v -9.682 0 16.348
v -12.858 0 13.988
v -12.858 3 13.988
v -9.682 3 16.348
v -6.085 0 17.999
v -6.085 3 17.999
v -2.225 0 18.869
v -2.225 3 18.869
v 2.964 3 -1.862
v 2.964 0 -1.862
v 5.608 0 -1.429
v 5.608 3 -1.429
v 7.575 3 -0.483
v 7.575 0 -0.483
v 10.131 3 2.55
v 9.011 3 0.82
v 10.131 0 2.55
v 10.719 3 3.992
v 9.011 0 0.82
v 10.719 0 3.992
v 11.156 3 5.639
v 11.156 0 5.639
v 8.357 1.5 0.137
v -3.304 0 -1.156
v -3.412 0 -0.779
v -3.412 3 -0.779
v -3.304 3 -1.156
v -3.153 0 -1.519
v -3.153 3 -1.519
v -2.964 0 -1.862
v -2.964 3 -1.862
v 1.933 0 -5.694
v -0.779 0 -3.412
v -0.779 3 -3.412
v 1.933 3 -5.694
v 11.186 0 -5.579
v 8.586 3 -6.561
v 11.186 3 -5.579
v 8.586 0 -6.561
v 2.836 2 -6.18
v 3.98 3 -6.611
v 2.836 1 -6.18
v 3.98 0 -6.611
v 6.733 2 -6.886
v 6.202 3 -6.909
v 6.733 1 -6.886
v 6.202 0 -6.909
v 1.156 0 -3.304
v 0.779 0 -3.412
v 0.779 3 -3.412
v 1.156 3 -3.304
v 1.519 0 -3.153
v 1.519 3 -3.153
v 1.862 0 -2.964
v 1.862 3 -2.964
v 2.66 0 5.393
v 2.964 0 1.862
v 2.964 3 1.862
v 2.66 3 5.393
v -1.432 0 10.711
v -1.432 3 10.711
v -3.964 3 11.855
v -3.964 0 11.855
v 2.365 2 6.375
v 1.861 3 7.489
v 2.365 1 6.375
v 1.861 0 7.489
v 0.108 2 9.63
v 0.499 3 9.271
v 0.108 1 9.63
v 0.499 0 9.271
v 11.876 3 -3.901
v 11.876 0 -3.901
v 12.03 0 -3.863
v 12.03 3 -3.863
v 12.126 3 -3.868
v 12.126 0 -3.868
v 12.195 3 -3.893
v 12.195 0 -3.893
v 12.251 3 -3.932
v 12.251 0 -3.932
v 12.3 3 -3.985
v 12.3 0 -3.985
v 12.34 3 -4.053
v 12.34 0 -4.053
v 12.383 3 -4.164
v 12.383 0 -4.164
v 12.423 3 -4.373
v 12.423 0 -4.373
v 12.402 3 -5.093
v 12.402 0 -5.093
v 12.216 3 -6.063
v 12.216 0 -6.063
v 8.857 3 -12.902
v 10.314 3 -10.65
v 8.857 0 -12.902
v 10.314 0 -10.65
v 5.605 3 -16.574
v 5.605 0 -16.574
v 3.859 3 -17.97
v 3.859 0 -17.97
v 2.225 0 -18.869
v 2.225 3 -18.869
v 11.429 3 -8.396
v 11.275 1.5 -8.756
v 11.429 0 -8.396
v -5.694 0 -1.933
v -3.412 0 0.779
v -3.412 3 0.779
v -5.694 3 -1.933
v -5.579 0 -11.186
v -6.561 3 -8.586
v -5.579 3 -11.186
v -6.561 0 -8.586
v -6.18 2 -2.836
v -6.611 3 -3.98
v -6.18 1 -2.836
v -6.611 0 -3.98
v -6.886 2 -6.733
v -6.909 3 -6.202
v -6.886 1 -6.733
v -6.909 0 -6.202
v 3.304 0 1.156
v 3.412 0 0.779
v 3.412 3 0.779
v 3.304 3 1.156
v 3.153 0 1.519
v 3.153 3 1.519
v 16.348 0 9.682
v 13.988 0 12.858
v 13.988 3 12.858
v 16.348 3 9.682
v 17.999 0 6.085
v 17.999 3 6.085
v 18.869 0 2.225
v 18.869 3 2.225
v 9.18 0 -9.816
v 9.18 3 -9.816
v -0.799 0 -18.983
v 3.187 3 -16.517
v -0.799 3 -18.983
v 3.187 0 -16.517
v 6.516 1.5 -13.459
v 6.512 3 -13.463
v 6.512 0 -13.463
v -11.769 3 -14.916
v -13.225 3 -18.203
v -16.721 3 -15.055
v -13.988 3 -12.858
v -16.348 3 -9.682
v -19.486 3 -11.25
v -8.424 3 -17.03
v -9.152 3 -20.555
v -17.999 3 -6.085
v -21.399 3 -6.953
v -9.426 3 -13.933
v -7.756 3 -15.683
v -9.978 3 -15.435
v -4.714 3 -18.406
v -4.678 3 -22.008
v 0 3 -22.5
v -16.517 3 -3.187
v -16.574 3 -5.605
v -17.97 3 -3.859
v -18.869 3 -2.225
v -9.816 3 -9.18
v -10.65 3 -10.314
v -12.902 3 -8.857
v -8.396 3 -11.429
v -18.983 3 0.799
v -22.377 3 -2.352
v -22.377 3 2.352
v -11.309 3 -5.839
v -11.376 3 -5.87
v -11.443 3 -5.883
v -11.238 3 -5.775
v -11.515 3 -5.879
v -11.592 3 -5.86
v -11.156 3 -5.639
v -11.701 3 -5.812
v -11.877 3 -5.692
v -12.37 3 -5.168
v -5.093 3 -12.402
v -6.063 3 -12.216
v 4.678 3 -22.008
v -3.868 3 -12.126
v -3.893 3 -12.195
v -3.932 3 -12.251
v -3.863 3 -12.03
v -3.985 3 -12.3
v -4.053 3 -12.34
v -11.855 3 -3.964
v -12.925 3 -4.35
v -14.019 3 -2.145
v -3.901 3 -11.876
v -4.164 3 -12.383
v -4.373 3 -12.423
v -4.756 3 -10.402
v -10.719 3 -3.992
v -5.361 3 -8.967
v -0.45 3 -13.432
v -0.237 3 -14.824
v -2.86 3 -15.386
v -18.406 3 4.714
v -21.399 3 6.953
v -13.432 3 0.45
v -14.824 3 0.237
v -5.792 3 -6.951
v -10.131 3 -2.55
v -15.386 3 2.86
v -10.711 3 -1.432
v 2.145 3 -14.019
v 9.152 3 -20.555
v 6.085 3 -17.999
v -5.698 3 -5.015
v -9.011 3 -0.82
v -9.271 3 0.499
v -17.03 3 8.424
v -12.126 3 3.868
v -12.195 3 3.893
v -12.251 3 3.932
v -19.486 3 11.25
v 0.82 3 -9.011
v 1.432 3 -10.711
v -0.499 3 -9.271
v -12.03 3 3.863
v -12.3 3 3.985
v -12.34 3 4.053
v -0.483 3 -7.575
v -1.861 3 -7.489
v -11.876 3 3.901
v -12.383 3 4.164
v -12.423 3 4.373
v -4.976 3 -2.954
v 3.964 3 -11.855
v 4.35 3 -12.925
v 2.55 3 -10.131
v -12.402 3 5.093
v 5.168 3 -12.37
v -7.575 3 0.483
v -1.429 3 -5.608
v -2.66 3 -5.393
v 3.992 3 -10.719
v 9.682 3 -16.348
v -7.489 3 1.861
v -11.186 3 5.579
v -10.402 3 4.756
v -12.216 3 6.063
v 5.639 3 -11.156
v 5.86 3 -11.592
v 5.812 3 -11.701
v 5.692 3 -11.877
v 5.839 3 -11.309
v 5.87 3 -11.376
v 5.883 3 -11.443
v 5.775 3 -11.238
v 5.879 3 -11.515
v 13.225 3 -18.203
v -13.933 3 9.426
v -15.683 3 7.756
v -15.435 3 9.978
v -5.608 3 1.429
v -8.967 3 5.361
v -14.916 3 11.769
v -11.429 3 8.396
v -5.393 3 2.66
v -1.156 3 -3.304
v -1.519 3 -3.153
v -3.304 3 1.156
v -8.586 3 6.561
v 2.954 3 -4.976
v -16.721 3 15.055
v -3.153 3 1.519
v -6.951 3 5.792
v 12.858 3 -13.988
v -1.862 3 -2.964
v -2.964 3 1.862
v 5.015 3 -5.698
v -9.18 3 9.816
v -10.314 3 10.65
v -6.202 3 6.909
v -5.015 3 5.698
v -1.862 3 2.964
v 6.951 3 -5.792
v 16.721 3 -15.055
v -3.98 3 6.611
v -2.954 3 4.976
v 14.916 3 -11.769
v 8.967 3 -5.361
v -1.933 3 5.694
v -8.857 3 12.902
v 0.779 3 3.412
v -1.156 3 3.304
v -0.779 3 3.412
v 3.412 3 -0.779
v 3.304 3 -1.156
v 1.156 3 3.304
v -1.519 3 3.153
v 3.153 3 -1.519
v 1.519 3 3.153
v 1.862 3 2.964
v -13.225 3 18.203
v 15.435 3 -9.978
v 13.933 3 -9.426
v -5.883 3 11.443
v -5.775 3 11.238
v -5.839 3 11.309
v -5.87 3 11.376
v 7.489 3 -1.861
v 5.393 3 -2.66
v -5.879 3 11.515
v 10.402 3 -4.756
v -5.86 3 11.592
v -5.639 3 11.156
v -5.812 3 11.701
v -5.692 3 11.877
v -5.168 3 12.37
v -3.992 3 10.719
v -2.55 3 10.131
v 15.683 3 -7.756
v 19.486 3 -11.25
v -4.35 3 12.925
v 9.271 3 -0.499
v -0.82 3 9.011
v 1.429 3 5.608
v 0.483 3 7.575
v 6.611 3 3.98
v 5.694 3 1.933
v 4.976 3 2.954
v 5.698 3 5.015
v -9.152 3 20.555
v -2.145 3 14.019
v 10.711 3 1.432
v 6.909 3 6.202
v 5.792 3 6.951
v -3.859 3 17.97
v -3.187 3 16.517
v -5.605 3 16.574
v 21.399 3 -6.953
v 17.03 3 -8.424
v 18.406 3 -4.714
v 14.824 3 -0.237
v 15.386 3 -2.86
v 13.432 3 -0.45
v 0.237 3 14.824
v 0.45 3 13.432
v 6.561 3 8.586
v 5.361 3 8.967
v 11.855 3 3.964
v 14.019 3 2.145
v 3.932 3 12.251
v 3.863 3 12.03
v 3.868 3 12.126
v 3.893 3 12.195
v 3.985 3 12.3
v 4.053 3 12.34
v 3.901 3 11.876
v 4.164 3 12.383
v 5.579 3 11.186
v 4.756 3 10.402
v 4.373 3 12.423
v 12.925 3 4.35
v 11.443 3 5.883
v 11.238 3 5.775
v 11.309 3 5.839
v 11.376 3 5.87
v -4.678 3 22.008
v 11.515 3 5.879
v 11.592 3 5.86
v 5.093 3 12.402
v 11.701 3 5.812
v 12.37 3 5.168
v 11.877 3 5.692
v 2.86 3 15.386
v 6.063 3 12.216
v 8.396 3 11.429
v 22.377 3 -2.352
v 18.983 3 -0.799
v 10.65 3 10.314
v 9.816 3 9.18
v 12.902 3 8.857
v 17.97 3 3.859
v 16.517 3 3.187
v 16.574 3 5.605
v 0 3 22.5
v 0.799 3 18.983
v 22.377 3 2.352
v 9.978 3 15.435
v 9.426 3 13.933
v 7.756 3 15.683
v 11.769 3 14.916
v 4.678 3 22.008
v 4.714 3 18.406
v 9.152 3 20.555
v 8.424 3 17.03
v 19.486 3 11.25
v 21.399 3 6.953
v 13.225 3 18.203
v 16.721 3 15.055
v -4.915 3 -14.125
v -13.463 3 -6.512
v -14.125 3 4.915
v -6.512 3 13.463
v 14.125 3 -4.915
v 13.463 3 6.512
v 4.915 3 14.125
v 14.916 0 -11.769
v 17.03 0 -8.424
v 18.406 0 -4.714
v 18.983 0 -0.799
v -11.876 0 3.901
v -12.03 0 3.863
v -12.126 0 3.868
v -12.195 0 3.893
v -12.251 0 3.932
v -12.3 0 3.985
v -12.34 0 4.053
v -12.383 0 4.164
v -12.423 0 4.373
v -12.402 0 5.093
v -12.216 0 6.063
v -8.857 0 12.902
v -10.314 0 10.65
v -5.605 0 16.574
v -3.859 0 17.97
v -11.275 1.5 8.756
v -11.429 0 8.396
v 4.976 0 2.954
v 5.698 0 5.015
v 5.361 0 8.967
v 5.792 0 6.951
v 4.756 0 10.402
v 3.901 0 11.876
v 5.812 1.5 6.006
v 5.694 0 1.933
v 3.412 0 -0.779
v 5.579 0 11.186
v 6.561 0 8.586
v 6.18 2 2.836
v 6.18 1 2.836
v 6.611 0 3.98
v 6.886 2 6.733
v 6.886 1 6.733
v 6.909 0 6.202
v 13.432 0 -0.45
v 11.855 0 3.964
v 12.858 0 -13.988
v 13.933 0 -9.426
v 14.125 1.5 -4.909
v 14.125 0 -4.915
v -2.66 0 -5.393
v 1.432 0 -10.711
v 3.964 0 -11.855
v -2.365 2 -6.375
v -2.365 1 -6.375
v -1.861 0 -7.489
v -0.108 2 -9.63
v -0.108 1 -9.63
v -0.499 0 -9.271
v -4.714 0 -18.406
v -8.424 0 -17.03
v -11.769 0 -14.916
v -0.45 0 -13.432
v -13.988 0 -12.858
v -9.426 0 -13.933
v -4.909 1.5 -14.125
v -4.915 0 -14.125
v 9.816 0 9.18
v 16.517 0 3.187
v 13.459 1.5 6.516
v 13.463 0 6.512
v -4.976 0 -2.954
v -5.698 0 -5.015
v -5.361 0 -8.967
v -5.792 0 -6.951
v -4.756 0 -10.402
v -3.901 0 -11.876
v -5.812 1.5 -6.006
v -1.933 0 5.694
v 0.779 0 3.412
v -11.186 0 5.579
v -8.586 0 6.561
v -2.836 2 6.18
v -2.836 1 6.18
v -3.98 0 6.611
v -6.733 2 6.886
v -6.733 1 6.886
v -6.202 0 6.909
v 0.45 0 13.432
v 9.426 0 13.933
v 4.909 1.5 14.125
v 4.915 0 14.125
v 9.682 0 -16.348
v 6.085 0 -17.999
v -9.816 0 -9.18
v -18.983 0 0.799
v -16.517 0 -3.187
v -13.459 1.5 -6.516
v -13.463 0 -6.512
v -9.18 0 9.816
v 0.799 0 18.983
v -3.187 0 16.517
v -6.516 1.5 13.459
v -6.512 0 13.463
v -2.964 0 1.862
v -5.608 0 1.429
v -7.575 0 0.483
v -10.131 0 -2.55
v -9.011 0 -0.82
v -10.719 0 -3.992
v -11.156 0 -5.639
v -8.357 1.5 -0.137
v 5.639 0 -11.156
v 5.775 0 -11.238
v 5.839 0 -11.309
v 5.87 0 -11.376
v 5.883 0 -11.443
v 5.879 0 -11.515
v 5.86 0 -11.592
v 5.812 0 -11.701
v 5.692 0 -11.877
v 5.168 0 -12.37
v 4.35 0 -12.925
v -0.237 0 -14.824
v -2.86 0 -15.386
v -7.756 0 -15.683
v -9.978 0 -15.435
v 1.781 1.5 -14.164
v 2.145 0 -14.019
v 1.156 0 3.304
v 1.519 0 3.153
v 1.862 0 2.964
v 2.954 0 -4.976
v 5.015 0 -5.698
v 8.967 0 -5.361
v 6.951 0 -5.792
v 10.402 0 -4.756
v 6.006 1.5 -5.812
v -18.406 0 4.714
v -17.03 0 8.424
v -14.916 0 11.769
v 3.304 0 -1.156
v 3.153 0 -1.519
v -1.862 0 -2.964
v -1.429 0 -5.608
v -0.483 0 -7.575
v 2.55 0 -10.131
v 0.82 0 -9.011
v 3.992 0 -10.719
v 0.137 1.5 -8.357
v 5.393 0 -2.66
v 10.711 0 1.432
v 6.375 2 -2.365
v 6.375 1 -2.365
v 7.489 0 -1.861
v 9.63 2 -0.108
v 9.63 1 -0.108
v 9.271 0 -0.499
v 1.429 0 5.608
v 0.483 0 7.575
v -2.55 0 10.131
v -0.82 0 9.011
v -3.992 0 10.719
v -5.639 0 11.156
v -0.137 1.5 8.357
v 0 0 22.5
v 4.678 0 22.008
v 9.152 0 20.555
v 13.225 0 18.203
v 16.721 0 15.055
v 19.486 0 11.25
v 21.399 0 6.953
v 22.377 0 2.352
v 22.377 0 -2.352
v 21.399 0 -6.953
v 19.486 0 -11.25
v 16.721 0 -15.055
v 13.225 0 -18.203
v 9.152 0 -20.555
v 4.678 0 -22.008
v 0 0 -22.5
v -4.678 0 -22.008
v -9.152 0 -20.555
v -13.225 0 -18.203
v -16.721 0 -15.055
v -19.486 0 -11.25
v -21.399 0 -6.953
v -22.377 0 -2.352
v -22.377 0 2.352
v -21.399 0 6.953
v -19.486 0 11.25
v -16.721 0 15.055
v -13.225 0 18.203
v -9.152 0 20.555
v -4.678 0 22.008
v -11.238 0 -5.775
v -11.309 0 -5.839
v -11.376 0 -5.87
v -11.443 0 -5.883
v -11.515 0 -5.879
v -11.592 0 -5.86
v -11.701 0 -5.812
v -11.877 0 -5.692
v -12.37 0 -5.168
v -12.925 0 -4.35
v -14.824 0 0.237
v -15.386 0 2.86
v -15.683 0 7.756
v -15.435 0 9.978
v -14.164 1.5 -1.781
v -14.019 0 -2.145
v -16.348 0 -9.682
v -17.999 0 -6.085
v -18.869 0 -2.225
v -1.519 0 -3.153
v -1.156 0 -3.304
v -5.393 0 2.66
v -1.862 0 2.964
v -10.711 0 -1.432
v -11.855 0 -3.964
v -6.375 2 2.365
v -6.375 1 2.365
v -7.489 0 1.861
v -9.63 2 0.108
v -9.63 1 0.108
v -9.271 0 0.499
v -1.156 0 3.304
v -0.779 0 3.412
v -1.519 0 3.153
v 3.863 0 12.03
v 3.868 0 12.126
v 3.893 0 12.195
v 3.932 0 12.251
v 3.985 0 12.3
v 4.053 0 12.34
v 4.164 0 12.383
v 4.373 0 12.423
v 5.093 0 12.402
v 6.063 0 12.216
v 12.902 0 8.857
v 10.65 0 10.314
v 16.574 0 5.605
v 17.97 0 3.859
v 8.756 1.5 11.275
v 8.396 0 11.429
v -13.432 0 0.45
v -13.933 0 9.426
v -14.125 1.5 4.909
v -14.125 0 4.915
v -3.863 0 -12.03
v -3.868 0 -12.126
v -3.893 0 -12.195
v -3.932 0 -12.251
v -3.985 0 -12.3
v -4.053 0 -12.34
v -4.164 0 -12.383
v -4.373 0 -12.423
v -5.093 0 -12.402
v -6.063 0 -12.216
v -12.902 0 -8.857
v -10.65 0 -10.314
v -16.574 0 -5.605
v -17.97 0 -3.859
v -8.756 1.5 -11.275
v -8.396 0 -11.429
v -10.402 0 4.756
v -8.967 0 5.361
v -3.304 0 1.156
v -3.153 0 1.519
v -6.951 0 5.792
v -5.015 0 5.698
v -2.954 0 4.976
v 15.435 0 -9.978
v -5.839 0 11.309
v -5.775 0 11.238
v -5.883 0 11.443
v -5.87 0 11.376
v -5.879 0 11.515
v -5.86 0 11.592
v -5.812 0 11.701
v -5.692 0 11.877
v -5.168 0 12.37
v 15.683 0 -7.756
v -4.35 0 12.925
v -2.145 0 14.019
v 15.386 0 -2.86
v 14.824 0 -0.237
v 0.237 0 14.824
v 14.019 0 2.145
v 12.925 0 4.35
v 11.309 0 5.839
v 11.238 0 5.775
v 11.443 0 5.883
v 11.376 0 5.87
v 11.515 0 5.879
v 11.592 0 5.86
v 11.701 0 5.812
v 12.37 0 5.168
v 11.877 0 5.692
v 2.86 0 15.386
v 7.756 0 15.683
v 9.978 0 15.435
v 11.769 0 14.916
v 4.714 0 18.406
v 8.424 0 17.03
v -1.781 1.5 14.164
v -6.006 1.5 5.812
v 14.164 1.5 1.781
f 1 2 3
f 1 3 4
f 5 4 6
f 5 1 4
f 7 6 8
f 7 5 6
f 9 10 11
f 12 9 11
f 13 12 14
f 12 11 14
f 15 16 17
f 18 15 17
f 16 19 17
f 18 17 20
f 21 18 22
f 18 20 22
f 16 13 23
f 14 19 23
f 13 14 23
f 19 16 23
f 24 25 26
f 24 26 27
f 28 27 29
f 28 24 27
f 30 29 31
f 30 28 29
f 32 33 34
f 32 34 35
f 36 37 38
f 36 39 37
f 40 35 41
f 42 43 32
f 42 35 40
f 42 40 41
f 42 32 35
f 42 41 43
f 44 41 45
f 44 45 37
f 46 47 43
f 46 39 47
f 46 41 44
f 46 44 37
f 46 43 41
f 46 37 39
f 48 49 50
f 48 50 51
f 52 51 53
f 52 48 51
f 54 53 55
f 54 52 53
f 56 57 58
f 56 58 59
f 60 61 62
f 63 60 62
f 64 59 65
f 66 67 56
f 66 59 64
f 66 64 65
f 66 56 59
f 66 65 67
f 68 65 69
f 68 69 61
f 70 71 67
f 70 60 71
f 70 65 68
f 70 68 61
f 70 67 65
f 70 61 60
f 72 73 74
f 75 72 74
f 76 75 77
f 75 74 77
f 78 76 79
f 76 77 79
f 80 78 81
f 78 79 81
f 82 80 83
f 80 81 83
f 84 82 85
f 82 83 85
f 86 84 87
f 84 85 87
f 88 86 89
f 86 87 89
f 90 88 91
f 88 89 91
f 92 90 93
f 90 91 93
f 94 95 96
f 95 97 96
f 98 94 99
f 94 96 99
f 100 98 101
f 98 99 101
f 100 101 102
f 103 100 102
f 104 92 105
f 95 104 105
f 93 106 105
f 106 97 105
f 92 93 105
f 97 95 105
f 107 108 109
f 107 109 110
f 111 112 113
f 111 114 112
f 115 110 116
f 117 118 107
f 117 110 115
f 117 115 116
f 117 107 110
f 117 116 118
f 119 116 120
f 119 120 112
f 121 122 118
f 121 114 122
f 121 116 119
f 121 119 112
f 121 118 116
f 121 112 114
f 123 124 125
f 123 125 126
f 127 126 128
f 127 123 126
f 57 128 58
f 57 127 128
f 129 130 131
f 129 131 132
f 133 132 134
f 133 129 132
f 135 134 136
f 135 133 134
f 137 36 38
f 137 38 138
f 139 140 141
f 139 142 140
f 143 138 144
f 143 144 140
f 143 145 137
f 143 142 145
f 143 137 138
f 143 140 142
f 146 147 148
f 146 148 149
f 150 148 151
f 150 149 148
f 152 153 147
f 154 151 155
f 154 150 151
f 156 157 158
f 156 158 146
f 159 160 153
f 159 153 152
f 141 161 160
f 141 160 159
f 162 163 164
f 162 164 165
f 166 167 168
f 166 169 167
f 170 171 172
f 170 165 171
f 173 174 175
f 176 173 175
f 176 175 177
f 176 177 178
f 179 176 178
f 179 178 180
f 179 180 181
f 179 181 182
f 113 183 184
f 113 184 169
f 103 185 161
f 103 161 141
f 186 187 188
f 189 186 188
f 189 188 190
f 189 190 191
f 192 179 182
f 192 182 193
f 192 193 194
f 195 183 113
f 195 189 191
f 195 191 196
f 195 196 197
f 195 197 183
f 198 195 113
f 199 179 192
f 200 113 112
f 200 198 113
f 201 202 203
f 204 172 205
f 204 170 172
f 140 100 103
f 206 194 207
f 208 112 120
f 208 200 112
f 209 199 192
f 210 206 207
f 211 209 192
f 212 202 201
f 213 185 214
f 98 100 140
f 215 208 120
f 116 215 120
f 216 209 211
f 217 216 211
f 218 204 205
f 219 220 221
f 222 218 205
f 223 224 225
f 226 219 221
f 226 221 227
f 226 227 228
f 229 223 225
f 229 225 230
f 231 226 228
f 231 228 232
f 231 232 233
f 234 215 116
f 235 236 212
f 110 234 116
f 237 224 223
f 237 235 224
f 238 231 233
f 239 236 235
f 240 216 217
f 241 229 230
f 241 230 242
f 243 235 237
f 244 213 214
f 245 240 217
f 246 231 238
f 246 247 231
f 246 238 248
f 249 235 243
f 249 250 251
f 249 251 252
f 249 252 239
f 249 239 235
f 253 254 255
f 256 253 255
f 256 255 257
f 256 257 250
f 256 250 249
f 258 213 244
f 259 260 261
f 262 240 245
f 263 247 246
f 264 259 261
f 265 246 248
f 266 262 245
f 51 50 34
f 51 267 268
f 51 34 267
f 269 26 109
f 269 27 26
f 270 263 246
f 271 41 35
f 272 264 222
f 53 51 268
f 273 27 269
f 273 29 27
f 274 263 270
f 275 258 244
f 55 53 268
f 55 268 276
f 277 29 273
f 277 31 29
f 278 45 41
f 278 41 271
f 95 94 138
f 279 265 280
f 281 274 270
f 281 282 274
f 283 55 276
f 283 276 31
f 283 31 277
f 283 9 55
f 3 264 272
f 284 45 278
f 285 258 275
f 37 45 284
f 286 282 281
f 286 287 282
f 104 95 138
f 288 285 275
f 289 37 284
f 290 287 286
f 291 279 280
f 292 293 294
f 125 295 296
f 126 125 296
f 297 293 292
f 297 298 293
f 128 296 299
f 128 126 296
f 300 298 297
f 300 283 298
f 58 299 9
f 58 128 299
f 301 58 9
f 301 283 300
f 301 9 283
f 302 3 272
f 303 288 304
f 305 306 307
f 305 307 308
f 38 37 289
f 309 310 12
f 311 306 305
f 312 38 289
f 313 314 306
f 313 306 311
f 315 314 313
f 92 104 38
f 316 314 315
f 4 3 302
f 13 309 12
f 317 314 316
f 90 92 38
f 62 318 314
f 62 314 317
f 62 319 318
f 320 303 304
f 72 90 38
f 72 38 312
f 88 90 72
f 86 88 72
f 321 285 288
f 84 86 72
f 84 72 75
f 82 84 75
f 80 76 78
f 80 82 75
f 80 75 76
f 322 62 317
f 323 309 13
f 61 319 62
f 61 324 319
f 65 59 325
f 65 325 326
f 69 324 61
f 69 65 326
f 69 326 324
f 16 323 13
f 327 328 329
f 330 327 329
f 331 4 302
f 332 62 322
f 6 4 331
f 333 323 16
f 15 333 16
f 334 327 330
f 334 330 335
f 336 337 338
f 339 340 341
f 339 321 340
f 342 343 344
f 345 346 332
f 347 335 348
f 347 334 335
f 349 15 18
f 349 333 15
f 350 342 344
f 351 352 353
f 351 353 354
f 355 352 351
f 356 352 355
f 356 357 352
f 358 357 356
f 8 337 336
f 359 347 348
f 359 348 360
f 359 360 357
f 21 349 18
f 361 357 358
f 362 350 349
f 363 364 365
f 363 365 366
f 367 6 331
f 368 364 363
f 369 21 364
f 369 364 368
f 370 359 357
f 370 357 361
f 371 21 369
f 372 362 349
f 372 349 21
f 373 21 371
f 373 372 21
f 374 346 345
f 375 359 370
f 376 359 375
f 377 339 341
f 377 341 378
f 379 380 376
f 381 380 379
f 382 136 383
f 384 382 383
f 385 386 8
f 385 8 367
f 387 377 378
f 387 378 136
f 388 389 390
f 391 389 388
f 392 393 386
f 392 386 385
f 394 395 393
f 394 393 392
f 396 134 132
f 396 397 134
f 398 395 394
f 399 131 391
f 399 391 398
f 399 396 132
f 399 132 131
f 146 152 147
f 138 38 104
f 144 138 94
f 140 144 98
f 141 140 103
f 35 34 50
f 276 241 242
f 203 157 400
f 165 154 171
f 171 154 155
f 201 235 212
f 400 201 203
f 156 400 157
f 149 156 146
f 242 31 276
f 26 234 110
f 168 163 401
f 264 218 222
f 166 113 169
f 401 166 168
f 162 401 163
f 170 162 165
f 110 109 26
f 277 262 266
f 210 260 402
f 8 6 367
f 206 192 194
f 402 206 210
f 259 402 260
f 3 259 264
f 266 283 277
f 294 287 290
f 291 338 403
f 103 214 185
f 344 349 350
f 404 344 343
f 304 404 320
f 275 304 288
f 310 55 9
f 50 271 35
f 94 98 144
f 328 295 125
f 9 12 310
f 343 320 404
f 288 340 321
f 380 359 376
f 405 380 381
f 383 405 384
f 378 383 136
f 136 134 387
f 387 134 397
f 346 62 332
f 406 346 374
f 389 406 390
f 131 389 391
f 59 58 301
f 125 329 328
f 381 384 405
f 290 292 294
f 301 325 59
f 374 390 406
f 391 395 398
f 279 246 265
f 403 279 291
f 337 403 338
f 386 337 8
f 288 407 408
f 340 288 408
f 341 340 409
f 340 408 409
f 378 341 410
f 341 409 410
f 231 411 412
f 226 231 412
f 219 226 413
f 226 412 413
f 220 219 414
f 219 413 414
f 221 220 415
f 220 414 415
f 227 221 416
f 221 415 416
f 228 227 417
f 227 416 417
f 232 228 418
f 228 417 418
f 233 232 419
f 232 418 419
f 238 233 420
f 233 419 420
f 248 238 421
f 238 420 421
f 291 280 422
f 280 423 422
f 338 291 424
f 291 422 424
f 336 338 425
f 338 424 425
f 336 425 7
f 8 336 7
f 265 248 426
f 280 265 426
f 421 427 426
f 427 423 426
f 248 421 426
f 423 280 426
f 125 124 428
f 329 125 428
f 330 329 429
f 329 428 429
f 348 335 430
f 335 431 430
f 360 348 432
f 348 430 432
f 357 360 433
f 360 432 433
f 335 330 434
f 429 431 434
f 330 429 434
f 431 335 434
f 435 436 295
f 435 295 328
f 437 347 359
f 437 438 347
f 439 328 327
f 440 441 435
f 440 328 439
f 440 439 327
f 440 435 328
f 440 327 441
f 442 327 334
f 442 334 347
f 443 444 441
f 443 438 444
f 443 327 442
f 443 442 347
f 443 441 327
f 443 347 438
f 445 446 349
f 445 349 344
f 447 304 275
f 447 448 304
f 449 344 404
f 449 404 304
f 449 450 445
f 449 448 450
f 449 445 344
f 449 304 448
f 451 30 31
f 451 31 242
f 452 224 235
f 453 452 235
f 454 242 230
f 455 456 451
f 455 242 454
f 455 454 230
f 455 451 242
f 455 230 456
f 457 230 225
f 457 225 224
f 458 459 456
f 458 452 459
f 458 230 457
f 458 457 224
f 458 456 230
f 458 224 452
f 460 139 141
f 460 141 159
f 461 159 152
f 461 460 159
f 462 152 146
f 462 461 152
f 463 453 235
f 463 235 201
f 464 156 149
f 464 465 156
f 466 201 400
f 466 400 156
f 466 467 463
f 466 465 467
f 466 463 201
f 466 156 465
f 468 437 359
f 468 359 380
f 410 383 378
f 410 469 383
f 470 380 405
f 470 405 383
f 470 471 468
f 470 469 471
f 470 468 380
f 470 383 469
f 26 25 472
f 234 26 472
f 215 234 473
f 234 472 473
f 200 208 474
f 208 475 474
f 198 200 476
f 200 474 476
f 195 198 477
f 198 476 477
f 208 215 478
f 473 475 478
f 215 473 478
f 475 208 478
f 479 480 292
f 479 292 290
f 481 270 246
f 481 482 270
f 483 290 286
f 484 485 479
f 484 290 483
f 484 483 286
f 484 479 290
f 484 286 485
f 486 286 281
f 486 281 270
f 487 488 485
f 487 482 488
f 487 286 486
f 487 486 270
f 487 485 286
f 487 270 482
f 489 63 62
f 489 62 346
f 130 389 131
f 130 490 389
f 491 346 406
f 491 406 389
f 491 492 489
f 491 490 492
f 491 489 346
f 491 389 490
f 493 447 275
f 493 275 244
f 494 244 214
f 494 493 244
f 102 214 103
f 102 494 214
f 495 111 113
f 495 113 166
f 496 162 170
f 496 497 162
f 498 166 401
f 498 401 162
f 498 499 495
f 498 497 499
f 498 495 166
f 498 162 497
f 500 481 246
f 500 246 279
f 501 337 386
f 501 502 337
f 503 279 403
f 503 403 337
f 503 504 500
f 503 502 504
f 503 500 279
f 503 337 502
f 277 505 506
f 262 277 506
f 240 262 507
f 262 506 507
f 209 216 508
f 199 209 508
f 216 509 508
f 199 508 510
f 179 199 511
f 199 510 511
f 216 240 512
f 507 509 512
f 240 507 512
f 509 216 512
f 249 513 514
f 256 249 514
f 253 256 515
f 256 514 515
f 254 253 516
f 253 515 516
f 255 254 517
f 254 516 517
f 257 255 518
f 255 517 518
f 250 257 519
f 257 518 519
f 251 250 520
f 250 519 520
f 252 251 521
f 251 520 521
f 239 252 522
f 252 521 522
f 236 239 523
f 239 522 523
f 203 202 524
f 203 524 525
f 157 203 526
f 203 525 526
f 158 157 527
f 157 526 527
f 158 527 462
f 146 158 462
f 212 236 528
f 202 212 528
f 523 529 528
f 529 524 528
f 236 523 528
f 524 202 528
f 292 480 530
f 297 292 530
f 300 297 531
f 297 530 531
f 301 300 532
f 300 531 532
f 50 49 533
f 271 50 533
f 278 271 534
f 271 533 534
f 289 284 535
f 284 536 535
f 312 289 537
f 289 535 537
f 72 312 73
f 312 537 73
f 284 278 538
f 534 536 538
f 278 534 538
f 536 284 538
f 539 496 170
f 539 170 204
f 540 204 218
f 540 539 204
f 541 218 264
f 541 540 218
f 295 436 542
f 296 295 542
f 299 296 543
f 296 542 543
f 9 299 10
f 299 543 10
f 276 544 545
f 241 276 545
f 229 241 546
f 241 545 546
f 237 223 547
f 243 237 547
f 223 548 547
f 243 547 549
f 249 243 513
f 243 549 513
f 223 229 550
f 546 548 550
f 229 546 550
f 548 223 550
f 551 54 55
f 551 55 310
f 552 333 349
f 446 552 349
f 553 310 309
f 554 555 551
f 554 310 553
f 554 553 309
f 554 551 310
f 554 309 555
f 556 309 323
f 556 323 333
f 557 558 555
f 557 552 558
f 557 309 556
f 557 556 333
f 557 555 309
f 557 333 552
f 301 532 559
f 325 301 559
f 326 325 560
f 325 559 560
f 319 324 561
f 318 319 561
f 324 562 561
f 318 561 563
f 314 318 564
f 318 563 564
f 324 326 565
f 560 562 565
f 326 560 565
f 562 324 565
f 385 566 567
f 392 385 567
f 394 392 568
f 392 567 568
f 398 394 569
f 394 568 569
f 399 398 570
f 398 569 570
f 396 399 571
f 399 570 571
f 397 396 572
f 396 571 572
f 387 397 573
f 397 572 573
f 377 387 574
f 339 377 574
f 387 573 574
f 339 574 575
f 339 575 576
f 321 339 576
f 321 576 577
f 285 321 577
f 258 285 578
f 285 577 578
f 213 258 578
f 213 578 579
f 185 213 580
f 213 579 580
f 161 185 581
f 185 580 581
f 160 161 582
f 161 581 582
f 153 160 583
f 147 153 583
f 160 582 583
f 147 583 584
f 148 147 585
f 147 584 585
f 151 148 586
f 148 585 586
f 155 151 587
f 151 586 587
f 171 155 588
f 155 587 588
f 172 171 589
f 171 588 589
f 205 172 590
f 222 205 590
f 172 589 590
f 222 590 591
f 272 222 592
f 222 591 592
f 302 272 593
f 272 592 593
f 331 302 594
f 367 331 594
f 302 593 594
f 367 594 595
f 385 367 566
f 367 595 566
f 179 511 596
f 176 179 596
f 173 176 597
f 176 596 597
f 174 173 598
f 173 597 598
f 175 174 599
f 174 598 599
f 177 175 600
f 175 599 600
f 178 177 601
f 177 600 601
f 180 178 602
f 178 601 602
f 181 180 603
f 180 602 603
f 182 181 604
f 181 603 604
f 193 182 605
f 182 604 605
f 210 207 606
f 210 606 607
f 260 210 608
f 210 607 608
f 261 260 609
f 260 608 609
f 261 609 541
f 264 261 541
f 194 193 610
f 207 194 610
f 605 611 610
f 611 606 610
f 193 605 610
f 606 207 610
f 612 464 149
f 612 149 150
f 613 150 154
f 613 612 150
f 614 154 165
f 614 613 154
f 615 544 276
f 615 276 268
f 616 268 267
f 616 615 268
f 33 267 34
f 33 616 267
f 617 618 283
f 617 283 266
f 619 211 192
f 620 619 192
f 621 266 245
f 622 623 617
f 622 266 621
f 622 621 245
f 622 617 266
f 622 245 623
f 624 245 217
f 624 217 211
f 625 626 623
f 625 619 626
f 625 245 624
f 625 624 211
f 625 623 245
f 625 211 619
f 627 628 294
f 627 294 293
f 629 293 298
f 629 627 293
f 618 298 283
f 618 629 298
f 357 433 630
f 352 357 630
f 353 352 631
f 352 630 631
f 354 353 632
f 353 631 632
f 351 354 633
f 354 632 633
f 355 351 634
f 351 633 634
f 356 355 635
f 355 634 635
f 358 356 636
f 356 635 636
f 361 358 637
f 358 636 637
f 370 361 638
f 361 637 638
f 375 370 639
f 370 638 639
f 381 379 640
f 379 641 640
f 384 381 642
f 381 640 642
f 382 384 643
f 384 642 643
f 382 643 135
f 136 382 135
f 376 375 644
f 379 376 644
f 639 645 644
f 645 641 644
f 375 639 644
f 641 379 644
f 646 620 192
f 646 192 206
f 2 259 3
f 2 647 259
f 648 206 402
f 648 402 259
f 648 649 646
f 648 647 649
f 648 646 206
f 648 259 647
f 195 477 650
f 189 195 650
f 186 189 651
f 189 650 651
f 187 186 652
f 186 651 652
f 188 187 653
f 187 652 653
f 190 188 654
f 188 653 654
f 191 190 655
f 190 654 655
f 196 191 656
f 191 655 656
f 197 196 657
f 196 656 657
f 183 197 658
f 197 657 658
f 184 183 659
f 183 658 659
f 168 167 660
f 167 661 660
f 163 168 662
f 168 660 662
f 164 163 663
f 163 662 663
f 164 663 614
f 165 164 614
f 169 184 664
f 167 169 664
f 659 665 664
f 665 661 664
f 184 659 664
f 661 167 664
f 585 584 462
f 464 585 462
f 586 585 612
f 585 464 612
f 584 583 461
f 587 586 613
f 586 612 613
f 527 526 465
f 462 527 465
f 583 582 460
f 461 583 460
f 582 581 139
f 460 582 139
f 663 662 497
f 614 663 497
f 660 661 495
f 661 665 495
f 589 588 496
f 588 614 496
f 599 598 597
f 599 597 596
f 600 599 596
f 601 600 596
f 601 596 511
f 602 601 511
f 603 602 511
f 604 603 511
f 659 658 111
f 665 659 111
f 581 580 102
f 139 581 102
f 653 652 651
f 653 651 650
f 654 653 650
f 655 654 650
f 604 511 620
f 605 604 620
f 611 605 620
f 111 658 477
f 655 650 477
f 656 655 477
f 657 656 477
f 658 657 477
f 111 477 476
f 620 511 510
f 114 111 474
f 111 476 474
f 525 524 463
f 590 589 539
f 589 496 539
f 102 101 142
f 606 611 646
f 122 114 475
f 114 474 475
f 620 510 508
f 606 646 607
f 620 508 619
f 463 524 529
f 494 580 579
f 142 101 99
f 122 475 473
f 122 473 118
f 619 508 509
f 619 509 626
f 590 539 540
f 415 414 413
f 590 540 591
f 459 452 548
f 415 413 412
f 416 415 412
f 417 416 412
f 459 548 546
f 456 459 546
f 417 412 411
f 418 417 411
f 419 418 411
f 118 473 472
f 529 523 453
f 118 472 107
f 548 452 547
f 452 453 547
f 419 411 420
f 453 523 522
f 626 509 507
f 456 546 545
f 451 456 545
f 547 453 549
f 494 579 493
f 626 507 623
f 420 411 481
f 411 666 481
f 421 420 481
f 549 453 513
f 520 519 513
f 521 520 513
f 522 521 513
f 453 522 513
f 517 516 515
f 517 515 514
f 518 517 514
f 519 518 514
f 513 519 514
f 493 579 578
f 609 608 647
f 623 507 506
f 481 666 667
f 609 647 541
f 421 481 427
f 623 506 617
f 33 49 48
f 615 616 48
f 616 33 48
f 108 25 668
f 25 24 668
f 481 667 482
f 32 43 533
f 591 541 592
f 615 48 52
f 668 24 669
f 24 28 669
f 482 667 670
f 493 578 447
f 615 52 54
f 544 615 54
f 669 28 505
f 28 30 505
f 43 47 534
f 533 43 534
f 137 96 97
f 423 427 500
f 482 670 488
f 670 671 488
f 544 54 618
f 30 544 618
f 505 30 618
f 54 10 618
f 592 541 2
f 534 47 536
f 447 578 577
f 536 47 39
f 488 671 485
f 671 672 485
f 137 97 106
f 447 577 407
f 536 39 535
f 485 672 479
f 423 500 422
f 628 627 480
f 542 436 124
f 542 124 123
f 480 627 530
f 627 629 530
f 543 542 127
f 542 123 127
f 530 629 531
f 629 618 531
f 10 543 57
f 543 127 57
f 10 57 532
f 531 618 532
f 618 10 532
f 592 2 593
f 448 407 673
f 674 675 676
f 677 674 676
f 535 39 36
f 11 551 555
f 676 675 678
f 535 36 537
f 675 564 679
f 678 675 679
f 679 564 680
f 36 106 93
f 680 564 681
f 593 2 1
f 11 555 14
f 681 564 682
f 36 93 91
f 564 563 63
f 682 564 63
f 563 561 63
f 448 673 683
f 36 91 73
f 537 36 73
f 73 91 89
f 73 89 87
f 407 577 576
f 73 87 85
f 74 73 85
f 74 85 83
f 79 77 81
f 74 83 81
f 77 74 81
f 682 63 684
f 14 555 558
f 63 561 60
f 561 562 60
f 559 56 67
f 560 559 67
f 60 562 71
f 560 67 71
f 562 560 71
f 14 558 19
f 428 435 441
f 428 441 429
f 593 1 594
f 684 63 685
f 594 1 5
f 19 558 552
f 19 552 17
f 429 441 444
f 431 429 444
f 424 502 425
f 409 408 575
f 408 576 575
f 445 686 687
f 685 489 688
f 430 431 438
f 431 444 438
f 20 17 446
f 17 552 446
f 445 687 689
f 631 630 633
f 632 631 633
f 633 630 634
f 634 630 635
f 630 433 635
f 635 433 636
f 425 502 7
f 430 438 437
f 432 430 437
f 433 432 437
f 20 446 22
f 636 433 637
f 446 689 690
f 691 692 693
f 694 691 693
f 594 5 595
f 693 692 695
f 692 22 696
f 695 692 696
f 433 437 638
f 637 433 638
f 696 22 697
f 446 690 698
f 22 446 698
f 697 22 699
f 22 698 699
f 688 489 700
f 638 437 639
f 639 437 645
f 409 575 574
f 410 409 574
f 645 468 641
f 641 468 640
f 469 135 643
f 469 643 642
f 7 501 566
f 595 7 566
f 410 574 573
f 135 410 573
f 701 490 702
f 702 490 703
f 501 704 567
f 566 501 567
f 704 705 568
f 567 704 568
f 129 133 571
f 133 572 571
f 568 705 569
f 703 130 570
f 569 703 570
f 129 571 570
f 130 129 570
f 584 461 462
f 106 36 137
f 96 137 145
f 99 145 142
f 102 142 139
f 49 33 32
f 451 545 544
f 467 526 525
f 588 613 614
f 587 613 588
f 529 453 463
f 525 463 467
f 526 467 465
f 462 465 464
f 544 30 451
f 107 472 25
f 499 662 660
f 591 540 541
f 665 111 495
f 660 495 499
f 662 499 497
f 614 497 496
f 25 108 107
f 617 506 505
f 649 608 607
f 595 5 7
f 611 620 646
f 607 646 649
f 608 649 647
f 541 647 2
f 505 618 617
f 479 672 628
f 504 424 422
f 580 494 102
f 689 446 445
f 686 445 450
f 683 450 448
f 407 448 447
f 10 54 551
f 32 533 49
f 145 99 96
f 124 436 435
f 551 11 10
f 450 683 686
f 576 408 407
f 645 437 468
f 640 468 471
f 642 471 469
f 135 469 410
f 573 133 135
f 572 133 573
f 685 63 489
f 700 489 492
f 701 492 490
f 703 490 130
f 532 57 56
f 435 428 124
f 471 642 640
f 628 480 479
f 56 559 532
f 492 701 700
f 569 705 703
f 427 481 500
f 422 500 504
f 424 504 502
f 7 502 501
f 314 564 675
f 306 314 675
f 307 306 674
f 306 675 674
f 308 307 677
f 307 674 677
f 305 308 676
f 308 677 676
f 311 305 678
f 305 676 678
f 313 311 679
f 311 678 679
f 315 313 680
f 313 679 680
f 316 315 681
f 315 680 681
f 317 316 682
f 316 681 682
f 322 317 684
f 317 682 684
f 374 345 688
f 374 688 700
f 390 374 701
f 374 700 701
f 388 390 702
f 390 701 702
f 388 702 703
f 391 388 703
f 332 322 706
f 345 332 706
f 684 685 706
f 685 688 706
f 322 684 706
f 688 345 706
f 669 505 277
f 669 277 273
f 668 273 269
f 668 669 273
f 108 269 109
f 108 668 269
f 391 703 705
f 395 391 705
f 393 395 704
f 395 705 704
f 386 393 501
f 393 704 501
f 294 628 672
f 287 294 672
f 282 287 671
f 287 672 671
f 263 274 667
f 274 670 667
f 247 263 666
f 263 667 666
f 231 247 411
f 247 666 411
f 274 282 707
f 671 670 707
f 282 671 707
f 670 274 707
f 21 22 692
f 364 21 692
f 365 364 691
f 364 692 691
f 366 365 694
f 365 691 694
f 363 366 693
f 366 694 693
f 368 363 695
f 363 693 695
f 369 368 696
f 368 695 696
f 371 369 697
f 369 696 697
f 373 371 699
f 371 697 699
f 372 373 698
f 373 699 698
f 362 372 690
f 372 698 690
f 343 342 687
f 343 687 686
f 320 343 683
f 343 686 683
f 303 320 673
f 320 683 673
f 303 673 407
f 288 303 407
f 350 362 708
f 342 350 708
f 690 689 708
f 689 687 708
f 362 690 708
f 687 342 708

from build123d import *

# Parameters (mm, degrees)
SKETCH1_R           = 22.5
BOSS_EXTRUDE1_DEPTH = 3


with BuildPart() as part:
    # Sketch1 → Boss-Extrude1 (new body)
    with BuildSketch(Plane(origin=(0, 0, 0), x_dir=(1, 0, 0), z_dir=(0, 1, 0))):
        with Locations(Location((0, 0, 0), (0, 0, 270))):
            Circle(SKETCH1_R)
        with BuildLine():
            ThreePointArc((12.858274793, 13.988022353), (7.926678354, 17.267535154), (2.224901963, 18.869282214))
            add(Edge.make_bspline(
                [(11.875562109, 3.901413152), (12.889627473, 3.505325226), (11.613923706, 10.788790468), (5.151799162, 17.696017864), (2.224901963, 18.869282214)],
                knots=[0, 0, 0, 0, 0.363857402, 1, 1, 1, 1], degree=3))
            add(Edge.make_bspline(
                [(0.778823269, 3.412247693), (5.685303017, 7.967969249), (11.875562109, 3.901413152)],
                knots=[0, 0, 0, 1, 1, 1], degree=2))
            ThreePointArc((0.778823269, 3.412247693), (1.339392013, 3.233578364), (1.862112268, 2.963534697))
            add(Edge.make_bspline(
                [(1.862112268, 2.963534697), (7.080742295, 3.142252132), (10.068013486, 1.06766484), (11.854735792, -3.964245112)],
                knots=[0, 0, 0, 0, 1, 1, 1, 1], degree=3))
            add(Edge.make_bspline(
                [(11.854735792, -3.964245112), (15.892673154, 4.806059129), (12.858274793, 13.988022353)],
                knots=[0, 0, 0, 1, 1, 1], degree=2))
        make_face(mode=Mode.SUBTRACT)
        with BuildLine():
            ThreePointArc((0.778823269, -3.412247693), (1.339392013, -3.233578364), (1.862112268, -2.963534697))
            add(Edge.make_bspline(
                [(1.862112268, -2.963534697), (1.614088771, -9.654321405), (-5.638574802, -11.156006194)],
                knots=[0, 0, 0, 1, 1, 1], degree=2))
            add(Edge.make_bspline(
                [(-5.638574802, -11.156006194), (-6.635703756, -11.592982231), (-0.583457308, -15.84111111), (8.870102109, -16.155846354), (11.769354144, -14.915840675)],
                knots=[0, 0, 0, 0, 0.363857402, 1, 1, 1, 1], degree=3))
            ThreePointArc((11.769354144, -14.915840675), (6.604983185, -17.814999218), (0.79885216, -18.983198762))
            add(Edge.make_bspline(
                [(-11.185708668, -5.579419467), (-7.839419958, -14.63621396), (0.79885216, -18.983198762)],
                knots=[0, 0, 0, 1, 1, 1], degree=2))
            add(Edge.make_bspline(
                [(0.778823269, -3.412247693), (-2.784933102, -7.228748683), (-6.36420756, -7.874113658), (-11.185708668, -5.579419467)],
                knots=[0, 0, 0, 0, 1, 1, 1, 1], degree=3))
        make_face(mode=Mode.SUBTRACT)
        with BuildLine():
            ThreePointArc((-0.79885216, 18.983198762), (-6.604983185, 17.814999218), (-11.769354144, 14.915840675))
            add(Edge.make_bspline(
                [(5.638574802, 11.156006194), (6.635703756, 11.592982231), (0.583457308, 15.84111111), (-8.870102109, 16.155846354), (-11.769354144, 14.915840675)],
                knots=[0, 0, 0, 0, 0.363857402, 1, 1, 1, 1], degree=3))
            add(Edge.make_bspline(
                [(-1.862112268, 2.963534697), (-1.614088771, 9.654321405), (5.638574802, 11.156006194)],
                knots=[0, 0, 0, 1, 1, 1], degree=2))
            ThreePointArc((-1.862112268, 2.963534697), (-1.339392013, 3.233578364), (-0.778823269, 3.412247693))
            add(Edge.make_bspline(
                [(-0.778823269, 3.412247693), (2.784933102, 7.228748683), (6.36420756, 7.874113658), (11.185708668, 5.579419467)],
                knots=[0, 0, 0, 0, 1, 1, 1, 1], degree=3))
            add(Edge.make_bspline(
                [(11.185708668, 5.579419467), (7.839419958, 14.63621396), (-0.79885216, 18.983198762)],
                knots=[0, 0, 0, 1, 1, 1], degree=2))
        make_face(mode=Mode.SUBTRACT)
        with BuildLine():
            ThreePointArc((-13.988022353, 12.858274793), (-17.267535154, 7.926678354), (-18.869282214, 2.224901963))
            add(Edge.make_bspline(
                [(-3.901413152, 11.875562109), (-3.505325226, 12.889627473), (-10.788790468, 11.613923706), (-17.696017864, 5.151799162), (-18.869282214, 2.224901963)],
                knots=[0, 0, 0, 0, 0.363857402, 1, 1, 1, 1], degree=3))
            add(Edge.make_bspline(
                [(-3.412247693, 0.778823269), (-7.967969249, 5.685303017), (-3.901413152, 11.875562109)],
                knots=[0, 0, 0, 1, 1, 1], degree=2))
            ThreePointArc((-3.412247693, 0.778823269), (-3.233578364, 1.339392013), (-2.963534697, 1.862112268))
            add(Edge.make_bspline(
                [(-2.963534697, 1.862112268), (-3.142252132, 7.080742295), (-1.06766484, 10.068013486), (3.964245112, 11.854735792)],
                knots=[0, 0, 0, 0, 1, 1, 1, 1], degree=3))
            add(Edge.make_bspline(
                [(3.964245112, 11.854735792), (-4.806059129, 15.892673154), (-13.988022353, 12.858274793)],
                knots=[0, 0, 0, 1, 1, 1], degree=2))
        make_face(mode=Mode.SUBTRACT)
        with BuildLine():
            ThreePointArc((-18.983198762, -0.79885216), (-17.814999218, -6.604983185), (-14.915840675, -11.769354144))
            add(Edge.make_bspline(
                [(-11.156006194, 5.638574802), (-11.592982231, 6.635703756), (-15.84111111, 0.583457308), (-16.155846354, -8.870102109), (-14.915840675, -11.769354144)],
                knots=[0, 0, 0, 0, 0.363857402, 1, 1, 1, 1], degree=3))
            add(Edge.make_bspline(
                [(-2.963534697, -1.862112268), (-9.654321405, -1.614088771), (-11.156006194, 5.638574802)],
                knots=[0, 0, 0, 1, 1, 1], degree=2))
            ThreePointArc((-2.963534697, -1.862112268), (-3.233578364, -1.339392013), (-3.412247693, -0.778823269))
            add(Edge.make_bspline(
                [(-3.412247693, -0.778823269), (-7.228748683, 2.784933102), (-7.874113658, 6.36420756), (-5.579419467, 11.185708668)],
                knots=[0, 0, 0, 0, 1, 1, 1, 1], degree=3))
            add(Edge.make_bspline(
                [(-5.579419467, 11.185708668), (-14.63621396, 7.839419958), (-18.983198762, -0.79885216)],
                knots=[0, 0, 0, 1, 1, 1], degree=2))
        make_face(mode=Mode.SUBTRACT)
        with BuildLine():
            ThreePointArc((-12.858274793, -13.988022353), (-7.926678354, -17.267535154), (-2.224901963, -18.869282214))
            add(Edge.make_bspline(
                [(-11.875562109, -3.901413152), (-12.889627473, -3.505325226), (-11.613923706, -10.788790468), (-5.151799162, -17.696017864), (-2.224901963, -18.869282214)],
                knots=[0, 0, 0, 0, 0.363857402, 1, 1, 1, 1], degree=3))
            add(Edge.make_bspline(
                [(-0.778823269, -3.412247693), (-5.685303017, -7.967969249), (-11.875562109, -3.901413152)],
                knots=[0, 0, 0, 1, 1, 1], degree=2))
            ThreePointArc((-0.778823269, -3.412247693), (-1.339392013, -3.233578364), (-1.862112268, -2.963534697))
            add(Edge.make_bspline(
                [(-1.862112268, -2.963534697), (-7.080742295, -3.142252132), (-10.068013486, -1.06766484), (-11.854735792, 3.964245112)],
                knots=[0, 0, 0, 0, 1, 1, 1, 1], degree=3))
            add(Edge.make_bspline(
                [(-11.854735792, 3.964245112), (-15.892673154, -4.806059129), (-12.858274793, -13.988022353)],
                knots=[0, 0, 0, 1, 1, 1], degree=2))
        make_face(mode=Mode.SUBTRACT)
        with BuildLine():
            ThreePointArc((13.988022353, -12.858274793), (17.267535154, -7.926678354), (18.869282214, -2.224901963))
            add(Edge.make_bspline(
                [(3.901413152, -11.875562109), (3.505325226, -12.889627473), (10.788790468, -11.613923706), (17.696017864, -5.151799162), (18.869282214, -2.224901963)],
                knots=[0, 0, 0, 0, 0.363857402, 1, 1, 1, 1], degree=3))
            add(Edge.make_bspline(
                [(3.412247693, -0.778823269), (7.967969249, -5.685303017), (3.901413152, -11.875562109)],
                knots=[0, 0, 0, 1, 1, 1], degree=2))
            ThreePointArc((3.412247693, -0.778823269), (3.233578364, -1.339392013), (2.963534697, -1.862112268))
            add(Edge.make_bspline(
                [(2.963534697, -1.862112268), (3.142252132, -7.080742295), (1.06766484, -10.068013486), (-3.964245112, -11.854735792)],
                knots=[0, 0, 0, 0, 1, 1, 1, 1], degree=3))
            add(Edge.make_bspline(
                [(-3.964245112, -11.854735792), (4.806059129, -15.892673154), (13.988022353, -12.858274793)],
                knots=[0, 0, 0, 1, 1, 1], degree=2))
        make_face(mode=Mode.SUBTRACT)
        with BuildLine():
            ThreePointArc((3.412247693, 0.778823269), (3.233578364, 1.339392013), (2.963534697, 1.862112268))
            add(Edge.make_bspline(
                [(2.963534697, 1.862112268), (9.654321405, 1.614088771), (11.156006194, -5.638574802)],
                knots=[0, 0, 0, 1, 1, 1], degree=2))
            add(Edge.make_bspline(
                [(11.156006194, -5.638574802), (11.592982231, -6.635703756), (15.84111111, -0.583457308), (16.155846354, 8.870102109), (14.915840675, 11.769354144)],
                knots=[0, 0, 0, 0, 0.363857402, 1, 1, 1, 1], degree=3))
            ThreePointArc((14.915840675, 11.769354144), (17.814999218, 6.604983185), (18.983198762, 0.79885216))
            add(Edge.make_bspline(
                [(5.579419467, -11.185708668), (14.63621396, -7.839419958), (18.983198762, 0.79885216)],
                knots=[0, 0, 0, 1, 1, 1], degree=2))
            add(Edge.make_bspline(
                [(3.412247693, 0.778823269), (7.228748683, -2.784933102), (7.874113658, -6.36420756), (5.579419467, -11.185708668)],
                knots=[0, 0, 0, 0, 1, 1, 1, 1], degree=3))
        make_face(mode=Mode.SUBTRACT)
    extrude(amount=BOSS_EXTRUDE1_DEPTH)


solid = part.part
